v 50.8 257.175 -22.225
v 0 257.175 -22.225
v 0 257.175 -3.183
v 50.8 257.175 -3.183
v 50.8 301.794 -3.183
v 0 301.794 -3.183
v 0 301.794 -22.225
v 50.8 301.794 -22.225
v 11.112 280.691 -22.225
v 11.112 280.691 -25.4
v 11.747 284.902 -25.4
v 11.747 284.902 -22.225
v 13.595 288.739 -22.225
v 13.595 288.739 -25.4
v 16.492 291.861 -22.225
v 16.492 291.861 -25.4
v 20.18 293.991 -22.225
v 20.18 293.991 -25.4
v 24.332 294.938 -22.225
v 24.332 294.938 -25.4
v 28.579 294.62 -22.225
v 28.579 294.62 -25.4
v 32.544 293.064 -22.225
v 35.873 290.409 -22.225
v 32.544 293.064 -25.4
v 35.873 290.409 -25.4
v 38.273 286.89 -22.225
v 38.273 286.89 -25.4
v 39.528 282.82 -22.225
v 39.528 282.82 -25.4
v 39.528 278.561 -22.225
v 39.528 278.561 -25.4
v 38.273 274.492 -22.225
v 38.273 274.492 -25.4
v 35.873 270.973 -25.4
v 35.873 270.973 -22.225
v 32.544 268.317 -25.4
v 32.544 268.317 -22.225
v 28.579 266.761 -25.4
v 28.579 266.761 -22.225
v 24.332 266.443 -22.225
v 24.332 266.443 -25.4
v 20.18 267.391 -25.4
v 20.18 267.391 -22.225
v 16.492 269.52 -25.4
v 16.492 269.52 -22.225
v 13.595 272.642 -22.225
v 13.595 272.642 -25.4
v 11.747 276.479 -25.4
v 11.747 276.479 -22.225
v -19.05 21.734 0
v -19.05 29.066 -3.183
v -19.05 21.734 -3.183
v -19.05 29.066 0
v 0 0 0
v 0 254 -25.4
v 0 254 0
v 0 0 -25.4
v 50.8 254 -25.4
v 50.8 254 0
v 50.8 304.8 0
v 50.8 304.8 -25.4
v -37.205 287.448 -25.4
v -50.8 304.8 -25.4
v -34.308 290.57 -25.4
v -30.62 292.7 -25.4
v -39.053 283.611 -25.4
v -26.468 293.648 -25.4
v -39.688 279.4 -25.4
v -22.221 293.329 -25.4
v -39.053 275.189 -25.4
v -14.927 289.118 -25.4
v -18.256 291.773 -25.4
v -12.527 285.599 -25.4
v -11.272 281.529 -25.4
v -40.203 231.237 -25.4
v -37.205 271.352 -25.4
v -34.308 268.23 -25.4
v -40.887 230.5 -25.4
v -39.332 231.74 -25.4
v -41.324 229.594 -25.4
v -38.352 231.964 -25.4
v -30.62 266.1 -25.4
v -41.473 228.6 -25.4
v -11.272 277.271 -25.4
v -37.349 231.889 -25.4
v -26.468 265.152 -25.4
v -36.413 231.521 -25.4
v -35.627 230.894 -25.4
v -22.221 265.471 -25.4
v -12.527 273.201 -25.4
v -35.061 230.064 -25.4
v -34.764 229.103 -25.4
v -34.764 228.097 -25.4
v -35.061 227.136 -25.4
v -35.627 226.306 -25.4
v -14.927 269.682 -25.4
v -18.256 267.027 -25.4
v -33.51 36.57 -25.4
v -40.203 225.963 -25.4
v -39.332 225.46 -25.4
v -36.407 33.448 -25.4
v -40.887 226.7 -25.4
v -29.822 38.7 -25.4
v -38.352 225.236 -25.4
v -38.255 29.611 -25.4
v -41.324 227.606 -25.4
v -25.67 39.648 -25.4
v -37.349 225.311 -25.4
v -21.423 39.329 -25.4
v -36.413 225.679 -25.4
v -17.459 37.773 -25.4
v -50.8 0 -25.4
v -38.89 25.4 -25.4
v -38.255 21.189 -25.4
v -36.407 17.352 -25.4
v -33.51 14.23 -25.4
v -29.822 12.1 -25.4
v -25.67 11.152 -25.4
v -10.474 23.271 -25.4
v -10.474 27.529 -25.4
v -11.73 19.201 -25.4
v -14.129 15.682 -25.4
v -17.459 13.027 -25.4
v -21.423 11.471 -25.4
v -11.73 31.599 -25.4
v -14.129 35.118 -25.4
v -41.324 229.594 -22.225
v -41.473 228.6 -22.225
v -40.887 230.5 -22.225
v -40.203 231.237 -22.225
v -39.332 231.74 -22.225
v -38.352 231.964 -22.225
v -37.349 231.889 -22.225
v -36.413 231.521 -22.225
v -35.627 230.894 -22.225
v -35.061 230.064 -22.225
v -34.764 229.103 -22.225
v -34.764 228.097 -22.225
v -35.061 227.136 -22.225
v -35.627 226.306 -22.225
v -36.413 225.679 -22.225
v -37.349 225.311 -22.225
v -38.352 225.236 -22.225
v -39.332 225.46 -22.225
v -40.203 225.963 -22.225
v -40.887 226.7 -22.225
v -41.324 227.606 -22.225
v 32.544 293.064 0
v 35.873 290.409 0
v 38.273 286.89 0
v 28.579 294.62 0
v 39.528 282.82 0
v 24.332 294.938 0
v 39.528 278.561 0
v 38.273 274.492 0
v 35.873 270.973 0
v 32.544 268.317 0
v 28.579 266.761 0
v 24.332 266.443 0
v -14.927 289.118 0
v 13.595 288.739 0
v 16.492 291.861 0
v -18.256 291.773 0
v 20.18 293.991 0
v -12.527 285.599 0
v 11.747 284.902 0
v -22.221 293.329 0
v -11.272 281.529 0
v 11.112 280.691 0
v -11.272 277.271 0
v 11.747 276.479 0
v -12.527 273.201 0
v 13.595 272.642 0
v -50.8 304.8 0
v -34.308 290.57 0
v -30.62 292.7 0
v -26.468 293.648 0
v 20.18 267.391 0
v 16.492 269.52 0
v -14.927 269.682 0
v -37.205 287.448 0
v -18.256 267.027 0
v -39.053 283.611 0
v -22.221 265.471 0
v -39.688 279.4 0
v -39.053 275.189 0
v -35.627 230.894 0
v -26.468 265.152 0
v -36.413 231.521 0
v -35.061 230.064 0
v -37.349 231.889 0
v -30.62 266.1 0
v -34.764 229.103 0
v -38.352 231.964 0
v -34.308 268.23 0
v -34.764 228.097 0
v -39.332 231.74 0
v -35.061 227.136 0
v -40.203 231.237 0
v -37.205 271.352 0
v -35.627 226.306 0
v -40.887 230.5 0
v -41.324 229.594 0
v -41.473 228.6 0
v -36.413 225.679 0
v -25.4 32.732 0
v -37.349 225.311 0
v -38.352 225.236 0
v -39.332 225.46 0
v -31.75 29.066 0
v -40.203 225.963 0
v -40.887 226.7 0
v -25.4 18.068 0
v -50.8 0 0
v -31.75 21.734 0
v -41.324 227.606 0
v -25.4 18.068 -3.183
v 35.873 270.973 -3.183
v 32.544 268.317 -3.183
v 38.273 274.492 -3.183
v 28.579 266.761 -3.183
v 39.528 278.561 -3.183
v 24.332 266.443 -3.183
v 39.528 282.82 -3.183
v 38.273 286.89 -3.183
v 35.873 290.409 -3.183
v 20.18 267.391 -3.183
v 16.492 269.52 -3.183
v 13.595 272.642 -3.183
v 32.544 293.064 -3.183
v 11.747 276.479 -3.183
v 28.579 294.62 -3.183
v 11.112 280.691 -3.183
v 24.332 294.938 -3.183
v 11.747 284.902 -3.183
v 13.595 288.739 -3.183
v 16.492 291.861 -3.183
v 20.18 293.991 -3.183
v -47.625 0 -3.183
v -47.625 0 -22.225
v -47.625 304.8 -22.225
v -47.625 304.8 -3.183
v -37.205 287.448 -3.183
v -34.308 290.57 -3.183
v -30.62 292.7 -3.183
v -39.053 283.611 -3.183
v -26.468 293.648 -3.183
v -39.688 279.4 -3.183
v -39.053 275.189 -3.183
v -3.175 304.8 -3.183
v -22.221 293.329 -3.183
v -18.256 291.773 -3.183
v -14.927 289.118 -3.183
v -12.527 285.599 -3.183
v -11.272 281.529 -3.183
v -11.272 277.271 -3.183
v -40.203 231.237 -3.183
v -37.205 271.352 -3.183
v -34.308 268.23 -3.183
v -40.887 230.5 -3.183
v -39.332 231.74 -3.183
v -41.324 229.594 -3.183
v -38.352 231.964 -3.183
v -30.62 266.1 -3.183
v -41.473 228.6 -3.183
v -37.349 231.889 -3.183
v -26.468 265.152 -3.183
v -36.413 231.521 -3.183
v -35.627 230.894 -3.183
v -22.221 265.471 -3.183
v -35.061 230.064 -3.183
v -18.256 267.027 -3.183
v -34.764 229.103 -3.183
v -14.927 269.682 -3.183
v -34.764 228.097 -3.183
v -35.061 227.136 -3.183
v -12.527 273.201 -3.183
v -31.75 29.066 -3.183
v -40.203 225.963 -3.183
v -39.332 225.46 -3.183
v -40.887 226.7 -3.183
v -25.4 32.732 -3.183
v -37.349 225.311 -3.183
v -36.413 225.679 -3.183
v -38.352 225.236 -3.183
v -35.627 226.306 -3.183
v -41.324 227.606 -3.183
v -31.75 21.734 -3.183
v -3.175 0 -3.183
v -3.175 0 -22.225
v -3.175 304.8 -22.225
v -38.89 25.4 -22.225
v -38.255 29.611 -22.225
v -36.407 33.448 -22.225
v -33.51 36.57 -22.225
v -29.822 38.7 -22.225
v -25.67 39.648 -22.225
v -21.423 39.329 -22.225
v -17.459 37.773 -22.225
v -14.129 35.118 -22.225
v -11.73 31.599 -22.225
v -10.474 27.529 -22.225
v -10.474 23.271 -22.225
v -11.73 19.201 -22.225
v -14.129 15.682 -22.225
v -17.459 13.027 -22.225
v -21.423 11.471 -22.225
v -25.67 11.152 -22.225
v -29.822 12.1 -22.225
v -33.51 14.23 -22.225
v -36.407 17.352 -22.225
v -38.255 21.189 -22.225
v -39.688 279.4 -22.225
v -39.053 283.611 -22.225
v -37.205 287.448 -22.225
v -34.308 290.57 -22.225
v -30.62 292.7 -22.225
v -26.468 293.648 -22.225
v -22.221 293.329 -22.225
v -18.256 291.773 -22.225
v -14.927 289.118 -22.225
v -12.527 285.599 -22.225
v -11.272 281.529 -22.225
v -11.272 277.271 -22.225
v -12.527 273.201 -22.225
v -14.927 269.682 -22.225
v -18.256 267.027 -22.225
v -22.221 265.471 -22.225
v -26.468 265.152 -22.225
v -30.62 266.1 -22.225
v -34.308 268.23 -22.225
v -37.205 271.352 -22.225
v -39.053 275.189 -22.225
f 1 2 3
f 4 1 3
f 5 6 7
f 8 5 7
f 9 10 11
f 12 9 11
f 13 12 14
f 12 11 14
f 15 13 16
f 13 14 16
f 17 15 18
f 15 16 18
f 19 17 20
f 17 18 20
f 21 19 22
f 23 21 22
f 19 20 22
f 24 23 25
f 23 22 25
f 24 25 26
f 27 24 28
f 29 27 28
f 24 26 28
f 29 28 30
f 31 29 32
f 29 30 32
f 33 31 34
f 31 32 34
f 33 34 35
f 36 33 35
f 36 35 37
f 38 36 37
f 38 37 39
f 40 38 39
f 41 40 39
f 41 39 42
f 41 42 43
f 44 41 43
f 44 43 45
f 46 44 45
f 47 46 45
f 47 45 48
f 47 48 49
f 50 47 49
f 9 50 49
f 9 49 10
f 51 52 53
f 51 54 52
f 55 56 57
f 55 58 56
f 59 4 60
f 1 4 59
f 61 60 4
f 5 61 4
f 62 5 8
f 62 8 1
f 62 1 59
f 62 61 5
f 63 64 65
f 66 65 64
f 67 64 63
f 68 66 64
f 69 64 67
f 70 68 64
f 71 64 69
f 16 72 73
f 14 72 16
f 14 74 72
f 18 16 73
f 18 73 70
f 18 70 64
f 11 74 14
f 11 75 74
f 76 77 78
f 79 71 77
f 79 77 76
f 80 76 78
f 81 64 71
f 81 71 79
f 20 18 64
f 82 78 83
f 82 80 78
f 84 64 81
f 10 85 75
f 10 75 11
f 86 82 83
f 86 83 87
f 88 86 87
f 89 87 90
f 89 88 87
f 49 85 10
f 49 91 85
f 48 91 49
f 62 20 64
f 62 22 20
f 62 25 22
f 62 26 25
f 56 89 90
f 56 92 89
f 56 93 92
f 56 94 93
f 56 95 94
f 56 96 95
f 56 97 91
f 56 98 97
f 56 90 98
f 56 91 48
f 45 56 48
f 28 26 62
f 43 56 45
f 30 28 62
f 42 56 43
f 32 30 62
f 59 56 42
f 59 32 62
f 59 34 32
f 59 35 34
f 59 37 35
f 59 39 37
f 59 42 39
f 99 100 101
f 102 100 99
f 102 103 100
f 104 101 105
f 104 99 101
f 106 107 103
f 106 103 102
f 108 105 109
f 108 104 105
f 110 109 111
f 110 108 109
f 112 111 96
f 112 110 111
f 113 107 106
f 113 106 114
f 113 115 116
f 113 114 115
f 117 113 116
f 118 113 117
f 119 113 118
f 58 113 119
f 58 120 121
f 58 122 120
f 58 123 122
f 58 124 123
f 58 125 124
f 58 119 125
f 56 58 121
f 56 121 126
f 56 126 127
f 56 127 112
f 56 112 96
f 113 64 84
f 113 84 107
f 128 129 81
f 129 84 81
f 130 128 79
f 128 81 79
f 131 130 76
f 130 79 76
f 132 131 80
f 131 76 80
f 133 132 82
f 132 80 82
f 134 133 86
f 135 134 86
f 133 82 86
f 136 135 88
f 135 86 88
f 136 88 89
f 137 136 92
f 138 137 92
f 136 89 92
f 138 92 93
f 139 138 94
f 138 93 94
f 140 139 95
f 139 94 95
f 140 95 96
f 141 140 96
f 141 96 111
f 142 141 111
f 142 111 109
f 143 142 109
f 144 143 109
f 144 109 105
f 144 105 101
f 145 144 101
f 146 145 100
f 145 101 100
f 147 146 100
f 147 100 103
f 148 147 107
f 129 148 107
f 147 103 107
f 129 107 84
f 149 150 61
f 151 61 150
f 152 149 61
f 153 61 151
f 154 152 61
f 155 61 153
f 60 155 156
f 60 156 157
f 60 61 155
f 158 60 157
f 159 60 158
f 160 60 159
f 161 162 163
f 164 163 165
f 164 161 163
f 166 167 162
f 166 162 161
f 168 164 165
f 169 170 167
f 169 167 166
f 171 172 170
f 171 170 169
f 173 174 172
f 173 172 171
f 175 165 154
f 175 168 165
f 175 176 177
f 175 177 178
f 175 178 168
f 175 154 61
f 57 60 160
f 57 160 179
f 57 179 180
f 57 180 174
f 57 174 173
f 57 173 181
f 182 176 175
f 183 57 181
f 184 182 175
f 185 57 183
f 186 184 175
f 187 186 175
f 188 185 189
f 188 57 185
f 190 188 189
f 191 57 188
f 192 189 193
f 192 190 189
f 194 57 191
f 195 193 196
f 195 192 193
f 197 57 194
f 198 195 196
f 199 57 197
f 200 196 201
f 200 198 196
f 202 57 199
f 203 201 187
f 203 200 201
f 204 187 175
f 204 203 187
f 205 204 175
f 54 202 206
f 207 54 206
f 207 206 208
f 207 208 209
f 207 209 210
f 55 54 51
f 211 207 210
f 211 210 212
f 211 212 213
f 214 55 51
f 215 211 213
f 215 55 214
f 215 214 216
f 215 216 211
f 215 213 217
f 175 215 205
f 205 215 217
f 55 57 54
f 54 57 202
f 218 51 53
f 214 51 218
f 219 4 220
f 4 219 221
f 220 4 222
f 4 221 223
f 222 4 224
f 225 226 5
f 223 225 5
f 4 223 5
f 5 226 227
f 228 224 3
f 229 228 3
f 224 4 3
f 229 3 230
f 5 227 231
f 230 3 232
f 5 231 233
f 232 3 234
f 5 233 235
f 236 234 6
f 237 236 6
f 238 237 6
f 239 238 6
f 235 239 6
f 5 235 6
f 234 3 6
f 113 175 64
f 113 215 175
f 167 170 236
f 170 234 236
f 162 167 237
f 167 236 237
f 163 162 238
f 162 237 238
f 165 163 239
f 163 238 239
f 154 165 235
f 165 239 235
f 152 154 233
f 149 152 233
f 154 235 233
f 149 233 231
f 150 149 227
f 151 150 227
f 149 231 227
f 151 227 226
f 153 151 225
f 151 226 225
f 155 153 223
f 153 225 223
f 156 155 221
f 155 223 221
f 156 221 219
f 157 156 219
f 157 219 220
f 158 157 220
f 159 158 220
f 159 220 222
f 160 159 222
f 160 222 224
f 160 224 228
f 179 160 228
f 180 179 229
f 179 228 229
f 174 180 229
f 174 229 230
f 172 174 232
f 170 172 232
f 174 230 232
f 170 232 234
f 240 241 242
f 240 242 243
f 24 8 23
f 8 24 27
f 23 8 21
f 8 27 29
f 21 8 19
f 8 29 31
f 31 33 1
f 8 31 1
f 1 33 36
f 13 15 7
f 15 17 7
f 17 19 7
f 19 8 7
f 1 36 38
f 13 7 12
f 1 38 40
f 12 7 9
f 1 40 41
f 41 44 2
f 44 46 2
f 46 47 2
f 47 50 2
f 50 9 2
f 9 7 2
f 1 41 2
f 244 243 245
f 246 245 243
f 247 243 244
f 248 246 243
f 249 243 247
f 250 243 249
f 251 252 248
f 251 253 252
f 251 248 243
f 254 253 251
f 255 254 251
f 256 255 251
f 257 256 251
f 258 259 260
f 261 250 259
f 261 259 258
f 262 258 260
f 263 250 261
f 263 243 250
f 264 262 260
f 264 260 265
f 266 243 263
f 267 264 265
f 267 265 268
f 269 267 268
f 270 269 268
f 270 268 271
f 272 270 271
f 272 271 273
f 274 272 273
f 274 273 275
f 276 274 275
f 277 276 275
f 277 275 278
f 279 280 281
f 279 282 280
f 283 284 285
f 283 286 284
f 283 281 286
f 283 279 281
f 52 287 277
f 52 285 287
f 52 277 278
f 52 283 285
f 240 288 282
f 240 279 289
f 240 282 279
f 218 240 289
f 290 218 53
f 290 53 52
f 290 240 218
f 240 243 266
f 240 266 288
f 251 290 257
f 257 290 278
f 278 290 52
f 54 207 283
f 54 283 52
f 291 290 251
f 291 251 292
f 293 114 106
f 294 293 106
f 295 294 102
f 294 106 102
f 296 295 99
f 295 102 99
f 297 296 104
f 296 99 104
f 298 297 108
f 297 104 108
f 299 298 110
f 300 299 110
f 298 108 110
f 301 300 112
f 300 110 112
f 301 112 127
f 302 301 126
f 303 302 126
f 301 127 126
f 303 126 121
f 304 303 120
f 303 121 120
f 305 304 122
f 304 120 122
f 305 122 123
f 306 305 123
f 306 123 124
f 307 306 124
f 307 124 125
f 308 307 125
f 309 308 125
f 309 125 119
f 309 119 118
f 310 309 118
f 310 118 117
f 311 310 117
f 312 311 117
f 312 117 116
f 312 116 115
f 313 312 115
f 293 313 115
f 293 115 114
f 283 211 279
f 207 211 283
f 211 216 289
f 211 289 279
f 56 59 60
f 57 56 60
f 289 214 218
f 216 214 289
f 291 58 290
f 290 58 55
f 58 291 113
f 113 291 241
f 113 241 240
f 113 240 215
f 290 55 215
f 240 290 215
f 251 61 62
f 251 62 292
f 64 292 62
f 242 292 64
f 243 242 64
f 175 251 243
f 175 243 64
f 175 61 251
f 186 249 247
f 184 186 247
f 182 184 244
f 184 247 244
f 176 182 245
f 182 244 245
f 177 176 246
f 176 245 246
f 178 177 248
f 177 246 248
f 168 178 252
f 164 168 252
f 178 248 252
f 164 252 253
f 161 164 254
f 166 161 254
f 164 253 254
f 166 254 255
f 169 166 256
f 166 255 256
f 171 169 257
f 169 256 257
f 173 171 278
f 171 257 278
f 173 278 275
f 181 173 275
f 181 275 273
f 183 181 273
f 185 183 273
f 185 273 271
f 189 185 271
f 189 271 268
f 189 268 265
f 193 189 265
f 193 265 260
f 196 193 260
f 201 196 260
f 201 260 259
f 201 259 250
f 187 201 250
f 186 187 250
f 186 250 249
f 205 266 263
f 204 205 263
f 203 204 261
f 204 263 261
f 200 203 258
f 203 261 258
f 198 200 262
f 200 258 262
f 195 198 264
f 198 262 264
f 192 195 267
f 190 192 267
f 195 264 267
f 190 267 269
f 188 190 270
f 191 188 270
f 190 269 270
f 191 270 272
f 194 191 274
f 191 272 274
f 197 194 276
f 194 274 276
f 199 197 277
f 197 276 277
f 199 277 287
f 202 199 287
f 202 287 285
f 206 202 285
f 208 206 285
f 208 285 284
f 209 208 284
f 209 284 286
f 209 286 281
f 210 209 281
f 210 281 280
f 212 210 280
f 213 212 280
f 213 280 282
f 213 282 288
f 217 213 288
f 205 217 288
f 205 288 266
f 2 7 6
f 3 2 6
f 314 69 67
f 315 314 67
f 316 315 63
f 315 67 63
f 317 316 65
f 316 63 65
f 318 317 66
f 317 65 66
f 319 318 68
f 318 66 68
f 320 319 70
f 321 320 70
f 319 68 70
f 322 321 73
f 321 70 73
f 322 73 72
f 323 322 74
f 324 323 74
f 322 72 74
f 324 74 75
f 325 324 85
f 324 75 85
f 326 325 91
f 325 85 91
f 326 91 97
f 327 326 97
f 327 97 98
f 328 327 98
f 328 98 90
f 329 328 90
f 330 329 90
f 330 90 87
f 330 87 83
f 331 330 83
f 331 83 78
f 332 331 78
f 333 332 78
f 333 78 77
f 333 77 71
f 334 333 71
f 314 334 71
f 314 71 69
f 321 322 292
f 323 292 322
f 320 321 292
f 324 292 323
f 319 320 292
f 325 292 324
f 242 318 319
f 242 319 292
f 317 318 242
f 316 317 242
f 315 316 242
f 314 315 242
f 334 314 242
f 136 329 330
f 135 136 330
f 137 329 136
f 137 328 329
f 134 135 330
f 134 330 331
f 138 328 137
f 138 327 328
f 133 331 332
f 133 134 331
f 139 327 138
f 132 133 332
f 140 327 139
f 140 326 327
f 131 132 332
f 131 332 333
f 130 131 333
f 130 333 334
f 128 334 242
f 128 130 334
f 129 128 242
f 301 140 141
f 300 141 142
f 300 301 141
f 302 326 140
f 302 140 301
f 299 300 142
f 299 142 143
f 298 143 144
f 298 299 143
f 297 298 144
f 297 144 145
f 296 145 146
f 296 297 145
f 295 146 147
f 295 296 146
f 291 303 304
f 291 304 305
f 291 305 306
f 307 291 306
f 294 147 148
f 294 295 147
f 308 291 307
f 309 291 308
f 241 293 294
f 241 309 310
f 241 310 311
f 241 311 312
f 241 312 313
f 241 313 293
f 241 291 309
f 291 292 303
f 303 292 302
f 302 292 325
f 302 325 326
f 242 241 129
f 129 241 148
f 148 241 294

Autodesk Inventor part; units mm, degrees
ref_plane "YZ Plane" through (0, 0, 0) normal (1, 0, 0) x (0, 1, 0)
ref_plane "XZ Plane" through (0, 0, 0) normal (0, 1, 0) x (-1, 0, 0)
ref_plane "XY Plane" through (0, 0, 0) normal (0, 0, 1) x (1, 0, 0)
sketch "Sketch1" plane through (0, 0, 0) normal (0, 1, 0) x (-1, 0, 0)
  line L0 (0, 0) -> (50.8, 0)
  line L1 (50.8, 0) -> (50.8, -25.4)
  line L2 (50.8, -25.4) -> (0, -25.4)
  line L3 (0, -25.4) -> (0, 0)
  line L4 (47.625, -3.1826) -> (3.175, -3.1826)
  line L5 (3.175, -3.1826) -> (3.175, -22.225)
  line L6 (3.175, -22.225) -> (47.625, -22.225)
  line L7 (47.625, -22.225) -> (47.625, -3.1826)
  dimension "d0" = 50.8
  dimension "d1" = 25.4
  dimension "d2" = 3.175
  dimension "d3" = 3.1826
  dimension "d4" = 3.175
  dimension "d5" = 3.175
extrude "Extrusion1" add sketch "Sketch1" along normal blind 304.8
sketch "Sketch2" plane through (0, 0, 0) normal (1, 0, 0) x (0, 0, -1)
  line L0 (25.4, 0) -> (25.4, 304.8) projected
  line L1 (0, 304.8) -> (25.4, 304.8)
  line L2 (25.4, 304.8) -> (25.4, 254)
  line L3 (25.4, 254) -> (0, 254)
  line L4 (0, 254) -> (0, 304.8)
  line L5 (3.1826, 0) -> (3.1826, 304.8) projected
  line L6 (3.1826, 301.7936) -> (22.225, 301.7936)
  line L7 (22.225, 301.7936) -> (22.225, 257.175)
  line L8 (22.225, 257.175) -> (3.1826, 257.175)
  line L9 (3.1826, 257.175) -> (3.1826, 301.7936)
  point P0 (0, 0)
  dimension "d8" = 50.8
  dimension "d9" = 3.175
  dimension "d10" = 3.175
extrude "Extrusion2" add sketch "Sketch2" along normal blind 50.8 contours L3 L5 L8 L7 L6 L1 L0 | L3 L4 L1 L5
sketch "Sketch3" plane through (0, 0, -25.4) normal (0, 0, -1) x (-1, 0, 0)
  circle A0 centre (-25.4, 280.6907) radius 14.2875
  line L0 (-50.8, 254) -> (-50.8, 304.8) projected
  point P0 (0, 0)
  dimension "d13" = 25.4
  dimension "d14" = 28.575
extrude "Extrusion3" cut sketch "Sketch3" against normal through all
sketch "Sketch4" plane through (0, 0, -25.4) normal (0, 0, -1) x (-1, 0, 0)
  circle A0 centre (24.6023, 25.4) radius 14.2875
  line L0 (50.8, 0) -> (0, 0) projected
  dimension "d17" = 25.4
  dimension "d18" = 28.575
extrude "Extrusion4" cut sketch "Sketch4" against normal up to next
sketch "Sketch5" plane through (0, 0, -25.4) normal (0, 0, -1) x (-1, 0, 0)
  circle A0 centre (25.4, 279.4) radius 14.2875
  line L0 (50.8, 304.8) -> (-50.8, 304.8) projected
  line L1 (50.8, 0) -> (50.8, 304.8) projected
  circle A1 centre (38.1, 228.6) radius 3.3734
  point P0 (0, 0)
  dimension "d21" = 25.4
  dimension "d22" = 28.575
  dimension "d23" = 25.4
  dimension "d32" = 6.7469
  dimension "d33" = 76.2
  dimension "d34" = 12.7
extrude "Extrusion5" cut sketch "Sketch5" against normal blind 25.4
sketch "Sketch6" plane through (-50.8, 0, 0) normal (0, 0, 1) x (1, 0, 0)
  line L0 (25.4, 18.0677) -> (19.05, 21.7338)
  line L1 (19.05, 21.7338) -> (19.05, 29.0662)
  line L2 (19.05, 29.0662) -> (25.4, 32.7323)
  line L3 (25.4, 32.7323) -> (31.75, 29.0662)
  line L4 (31.75, 29.0662) -> (31.75, 21.7338)
  line L5 (31.75, 21.7338) -> (25.4, 18.0677)
  line L6 (50.8, 0) -> (50.8, 254) projected
  line L7 (50.8, 0) -> (0, 0) projected
  point P0 (25.4, 25.4)
  dimension "d26" = 25.4
  dimension "d27" = 25.4
  dimension "d28" = 19.05
  dimension "d29" = 12.7
extrude "Extrusion6" cut sketch "Sketch6" against normal through all
properties part number "arm_new1" material "Aluminum 6061"
